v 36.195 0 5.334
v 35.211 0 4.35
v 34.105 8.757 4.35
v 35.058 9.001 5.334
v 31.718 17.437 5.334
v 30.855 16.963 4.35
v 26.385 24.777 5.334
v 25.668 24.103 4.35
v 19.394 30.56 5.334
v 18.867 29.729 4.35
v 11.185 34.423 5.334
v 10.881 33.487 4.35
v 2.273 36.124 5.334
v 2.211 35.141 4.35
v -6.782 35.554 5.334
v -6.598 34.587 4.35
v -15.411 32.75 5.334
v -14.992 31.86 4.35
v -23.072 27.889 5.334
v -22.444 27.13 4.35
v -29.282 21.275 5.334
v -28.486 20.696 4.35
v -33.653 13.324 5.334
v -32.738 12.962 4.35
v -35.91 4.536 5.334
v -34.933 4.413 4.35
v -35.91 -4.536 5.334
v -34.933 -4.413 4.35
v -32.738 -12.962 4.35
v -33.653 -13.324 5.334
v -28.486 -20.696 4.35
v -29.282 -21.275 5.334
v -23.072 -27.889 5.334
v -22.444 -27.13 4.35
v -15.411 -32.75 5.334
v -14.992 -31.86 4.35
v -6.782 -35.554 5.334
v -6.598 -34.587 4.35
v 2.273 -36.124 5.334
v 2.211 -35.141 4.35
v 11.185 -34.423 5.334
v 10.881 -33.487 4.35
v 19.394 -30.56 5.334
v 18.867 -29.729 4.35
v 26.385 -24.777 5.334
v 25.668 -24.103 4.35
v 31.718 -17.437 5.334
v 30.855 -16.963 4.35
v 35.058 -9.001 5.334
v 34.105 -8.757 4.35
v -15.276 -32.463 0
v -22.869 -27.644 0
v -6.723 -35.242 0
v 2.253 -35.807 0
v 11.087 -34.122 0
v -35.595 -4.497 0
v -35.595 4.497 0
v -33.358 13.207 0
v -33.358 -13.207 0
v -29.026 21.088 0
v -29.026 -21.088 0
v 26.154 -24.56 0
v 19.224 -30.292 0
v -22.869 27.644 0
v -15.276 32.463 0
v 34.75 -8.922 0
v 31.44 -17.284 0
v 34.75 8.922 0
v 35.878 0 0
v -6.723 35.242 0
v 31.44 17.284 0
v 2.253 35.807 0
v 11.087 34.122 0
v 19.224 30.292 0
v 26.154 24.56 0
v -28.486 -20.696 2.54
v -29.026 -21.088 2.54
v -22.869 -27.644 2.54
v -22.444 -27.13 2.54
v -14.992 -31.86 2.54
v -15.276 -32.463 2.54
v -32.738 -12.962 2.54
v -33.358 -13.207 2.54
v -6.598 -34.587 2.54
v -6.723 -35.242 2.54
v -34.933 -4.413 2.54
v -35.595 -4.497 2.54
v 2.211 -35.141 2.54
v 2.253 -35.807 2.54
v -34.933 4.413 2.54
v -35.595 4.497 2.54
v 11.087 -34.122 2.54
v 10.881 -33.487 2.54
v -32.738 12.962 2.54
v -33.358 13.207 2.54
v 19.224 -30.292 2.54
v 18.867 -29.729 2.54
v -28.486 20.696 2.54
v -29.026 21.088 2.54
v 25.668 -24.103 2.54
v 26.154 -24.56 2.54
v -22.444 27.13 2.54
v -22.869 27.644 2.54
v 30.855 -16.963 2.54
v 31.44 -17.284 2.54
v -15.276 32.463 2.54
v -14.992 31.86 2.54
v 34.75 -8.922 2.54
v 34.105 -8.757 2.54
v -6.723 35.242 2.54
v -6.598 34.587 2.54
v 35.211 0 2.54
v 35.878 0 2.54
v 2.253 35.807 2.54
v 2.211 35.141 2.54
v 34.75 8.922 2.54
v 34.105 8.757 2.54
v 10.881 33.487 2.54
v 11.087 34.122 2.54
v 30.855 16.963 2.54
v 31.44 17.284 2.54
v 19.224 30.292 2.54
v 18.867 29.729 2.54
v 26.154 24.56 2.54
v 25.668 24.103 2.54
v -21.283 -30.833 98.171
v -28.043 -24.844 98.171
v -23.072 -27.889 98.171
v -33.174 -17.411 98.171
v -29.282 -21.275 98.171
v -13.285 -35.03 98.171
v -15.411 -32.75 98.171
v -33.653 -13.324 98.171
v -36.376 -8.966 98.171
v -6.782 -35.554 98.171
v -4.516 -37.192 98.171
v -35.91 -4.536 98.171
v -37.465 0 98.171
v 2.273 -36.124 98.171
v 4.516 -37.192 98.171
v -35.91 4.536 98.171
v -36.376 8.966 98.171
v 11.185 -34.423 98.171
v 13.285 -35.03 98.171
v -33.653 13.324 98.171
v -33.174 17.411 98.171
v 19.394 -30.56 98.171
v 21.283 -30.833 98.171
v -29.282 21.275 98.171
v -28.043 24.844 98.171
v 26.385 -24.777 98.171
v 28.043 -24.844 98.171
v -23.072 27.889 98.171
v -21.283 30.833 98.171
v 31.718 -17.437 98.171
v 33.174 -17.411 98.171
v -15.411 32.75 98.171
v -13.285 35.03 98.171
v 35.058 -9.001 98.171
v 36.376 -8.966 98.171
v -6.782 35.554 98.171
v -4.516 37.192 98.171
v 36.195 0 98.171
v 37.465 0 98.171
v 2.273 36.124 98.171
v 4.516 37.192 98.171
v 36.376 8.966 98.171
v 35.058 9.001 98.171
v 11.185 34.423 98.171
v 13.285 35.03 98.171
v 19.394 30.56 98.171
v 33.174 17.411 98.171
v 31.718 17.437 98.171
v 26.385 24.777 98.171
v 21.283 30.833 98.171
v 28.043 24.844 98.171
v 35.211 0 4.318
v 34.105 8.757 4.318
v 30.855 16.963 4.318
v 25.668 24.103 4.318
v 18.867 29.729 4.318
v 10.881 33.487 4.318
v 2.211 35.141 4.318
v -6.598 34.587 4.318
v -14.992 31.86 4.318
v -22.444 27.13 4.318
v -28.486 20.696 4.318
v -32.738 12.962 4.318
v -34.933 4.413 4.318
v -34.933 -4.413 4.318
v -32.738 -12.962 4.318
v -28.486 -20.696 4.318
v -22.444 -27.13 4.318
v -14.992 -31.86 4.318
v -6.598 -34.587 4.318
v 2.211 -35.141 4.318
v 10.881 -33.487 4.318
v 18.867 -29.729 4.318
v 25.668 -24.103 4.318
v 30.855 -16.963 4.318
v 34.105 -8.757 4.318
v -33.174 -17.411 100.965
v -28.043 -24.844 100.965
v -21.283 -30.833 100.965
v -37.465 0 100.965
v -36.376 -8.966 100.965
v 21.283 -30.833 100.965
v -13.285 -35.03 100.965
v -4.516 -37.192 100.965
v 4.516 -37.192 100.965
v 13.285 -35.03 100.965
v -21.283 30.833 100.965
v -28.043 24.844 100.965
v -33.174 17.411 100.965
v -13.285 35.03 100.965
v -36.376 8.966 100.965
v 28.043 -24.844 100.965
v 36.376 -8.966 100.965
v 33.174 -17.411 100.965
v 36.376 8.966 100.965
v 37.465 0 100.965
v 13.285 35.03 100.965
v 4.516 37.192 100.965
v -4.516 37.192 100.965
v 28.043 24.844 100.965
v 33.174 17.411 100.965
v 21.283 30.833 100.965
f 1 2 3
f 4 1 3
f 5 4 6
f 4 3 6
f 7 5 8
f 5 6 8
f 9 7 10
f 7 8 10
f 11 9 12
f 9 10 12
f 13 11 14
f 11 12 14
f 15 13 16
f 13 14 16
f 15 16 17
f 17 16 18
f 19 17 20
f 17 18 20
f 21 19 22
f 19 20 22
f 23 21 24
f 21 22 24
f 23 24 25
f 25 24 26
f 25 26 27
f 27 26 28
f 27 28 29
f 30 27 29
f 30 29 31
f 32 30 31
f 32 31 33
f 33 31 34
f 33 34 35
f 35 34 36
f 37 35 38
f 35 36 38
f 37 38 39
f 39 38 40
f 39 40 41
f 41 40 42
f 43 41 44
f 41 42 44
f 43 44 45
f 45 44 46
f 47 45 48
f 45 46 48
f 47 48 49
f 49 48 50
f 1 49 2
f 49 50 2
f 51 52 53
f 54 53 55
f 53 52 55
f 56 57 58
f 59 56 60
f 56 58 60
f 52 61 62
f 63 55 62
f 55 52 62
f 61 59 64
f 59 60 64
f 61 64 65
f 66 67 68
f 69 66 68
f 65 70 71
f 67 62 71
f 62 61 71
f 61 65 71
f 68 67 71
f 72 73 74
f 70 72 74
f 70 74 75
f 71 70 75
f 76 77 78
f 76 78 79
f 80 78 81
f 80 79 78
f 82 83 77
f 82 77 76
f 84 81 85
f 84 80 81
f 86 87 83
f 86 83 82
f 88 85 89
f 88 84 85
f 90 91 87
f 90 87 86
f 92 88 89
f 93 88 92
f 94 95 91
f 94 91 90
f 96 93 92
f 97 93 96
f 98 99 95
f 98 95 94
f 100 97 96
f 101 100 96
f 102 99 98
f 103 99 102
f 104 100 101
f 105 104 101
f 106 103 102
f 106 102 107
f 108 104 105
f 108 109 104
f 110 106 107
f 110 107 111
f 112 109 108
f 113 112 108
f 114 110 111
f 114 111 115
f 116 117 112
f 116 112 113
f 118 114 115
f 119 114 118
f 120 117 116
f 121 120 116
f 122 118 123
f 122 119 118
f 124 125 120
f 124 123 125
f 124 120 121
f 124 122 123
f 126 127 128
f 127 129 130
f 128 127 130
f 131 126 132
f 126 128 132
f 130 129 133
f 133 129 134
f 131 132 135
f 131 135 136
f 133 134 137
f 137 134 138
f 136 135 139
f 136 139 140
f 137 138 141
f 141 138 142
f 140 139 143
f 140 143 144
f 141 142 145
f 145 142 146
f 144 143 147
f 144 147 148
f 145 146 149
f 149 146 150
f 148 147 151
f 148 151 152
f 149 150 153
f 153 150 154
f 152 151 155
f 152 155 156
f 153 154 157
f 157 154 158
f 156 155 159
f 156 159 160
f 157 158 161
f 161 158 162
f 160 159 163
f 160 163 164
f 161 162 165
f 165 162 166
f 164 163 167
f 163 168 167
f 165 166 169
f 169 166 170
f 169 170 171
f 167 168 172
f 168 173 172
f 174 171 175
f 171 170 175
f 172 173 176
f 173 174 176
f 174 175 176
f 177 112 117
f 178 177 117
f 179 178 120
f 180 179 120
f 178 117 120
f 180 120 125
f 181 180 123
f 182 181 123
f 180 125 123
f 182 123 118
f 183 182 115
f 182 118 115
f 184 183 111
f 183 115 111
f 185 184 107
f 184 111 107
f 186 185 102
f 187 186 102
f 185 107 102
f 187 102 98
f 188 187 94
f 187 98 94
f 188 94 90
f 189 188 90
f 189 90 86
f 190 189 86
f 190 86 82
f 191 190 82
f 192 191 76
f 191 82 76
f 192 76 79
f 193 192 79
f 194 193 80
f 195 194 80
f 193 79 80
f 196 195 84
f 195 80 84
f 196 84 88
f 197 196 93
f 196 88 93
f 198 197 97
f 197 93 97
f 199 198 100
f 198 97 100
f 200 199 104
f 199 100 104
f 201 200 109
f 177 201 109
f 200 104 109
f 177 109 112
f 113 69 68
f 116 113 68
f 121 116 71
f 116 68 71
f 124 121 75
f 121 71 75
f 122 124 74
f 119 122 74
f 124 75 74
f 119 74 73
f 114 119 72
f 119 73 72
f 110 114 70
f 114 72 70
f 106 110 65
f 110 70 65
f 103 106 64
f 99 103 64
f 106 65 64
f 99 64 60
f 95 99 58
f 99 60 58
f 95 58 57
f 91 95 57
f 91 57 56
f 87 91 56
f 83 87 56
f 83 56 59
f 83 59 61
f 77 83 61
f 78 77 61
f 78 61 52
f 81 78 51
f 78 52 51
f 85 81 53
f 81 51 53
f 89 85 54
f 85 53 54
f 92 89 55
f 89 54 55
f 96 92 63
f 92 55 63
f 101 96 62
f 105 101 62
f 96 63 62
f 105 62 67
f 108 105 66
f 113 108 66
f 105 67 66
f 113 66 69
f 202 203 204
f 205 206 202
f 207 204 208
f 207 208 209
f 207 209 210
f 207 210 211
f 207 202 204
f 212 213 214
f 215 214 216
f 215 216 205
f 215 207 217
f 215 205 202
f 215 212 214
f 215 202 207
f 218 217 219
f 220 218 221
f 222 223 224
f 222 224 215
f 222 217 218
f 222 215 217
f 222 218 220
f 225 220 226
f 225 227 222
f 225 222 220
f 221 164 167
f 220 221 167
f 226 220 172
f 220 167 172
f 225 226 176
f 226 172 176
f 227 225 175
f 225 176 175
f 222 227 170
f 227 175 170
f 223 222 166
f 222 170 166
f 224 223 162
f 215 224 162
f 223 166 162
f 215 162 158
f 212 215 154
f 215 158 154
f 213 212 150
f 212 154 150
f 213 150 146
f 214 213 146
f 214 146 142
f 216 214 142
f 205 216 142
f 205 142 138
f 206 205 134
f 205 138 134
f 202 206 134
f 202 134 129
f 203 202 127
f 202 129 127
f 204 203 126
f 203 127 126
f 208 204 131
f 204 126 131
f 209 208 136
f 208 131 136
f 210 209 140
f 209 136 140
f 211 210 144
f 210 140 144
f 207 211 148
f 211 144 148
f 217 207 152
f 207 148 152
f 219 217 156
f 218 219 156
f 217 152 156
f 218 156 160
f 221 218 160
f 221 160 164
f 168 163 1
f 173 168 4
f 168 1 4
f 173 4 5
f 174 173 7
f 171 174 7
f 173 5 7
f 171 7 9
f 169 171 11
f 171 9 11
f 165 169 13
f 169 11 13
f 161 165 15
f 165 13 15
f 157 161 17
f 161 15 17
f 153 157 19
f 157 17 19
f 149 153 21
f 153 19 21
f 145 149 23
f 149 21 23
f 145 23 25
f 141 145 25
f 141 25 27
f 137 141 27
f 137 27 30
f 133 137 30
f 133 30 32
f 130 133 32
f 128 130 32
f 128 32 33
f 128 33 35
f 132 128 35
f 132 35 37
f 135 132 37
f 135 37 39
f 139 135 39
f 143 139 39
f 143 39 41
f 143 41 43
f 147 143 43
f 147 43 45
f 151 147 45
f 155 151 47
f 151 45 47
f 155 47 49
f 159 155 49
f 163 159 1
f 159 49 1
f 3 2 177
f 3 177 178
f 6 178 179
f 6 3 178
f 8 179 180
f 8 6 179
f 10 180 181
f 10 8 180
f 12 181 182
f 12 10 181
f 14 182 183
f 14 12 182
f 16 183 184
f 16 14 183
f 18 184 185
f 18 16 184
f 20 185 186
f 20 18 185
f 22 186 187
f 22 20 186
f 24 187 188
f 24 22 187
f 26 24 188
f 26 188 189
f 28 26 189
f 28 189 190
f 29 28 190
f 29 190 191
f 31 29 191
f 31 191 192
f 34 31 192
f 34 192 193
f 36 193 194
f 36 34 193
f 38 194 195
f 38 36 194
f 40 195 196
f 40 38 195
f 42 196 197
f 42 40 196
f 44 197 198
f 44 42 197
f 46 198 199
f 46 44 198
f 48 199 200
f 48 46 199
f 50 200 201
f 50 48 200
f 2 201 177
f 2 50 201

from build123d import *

# Parameters (mm, degrees)
F0_R        = 35.8775
F1_DEPTH    = 2.54
F2_R        = 35.21075
F3_DEPTH    = 1.778
F4_R        = 36.195
F5_DEPTH    = 93.853
F6_R        = 37.465
F7_DEPTH    = 2.794
F8_S5_R     = 35.21075
F8_T6_DEPTH = 53


# Not quite as in the source:
# - a fillet or chamfer that OpenCascade refuses, or shapes differently, is made with other operations: its cross-section is extruded or revolved along the edge and cut away or added


with BuildPart() as f1:
    # F0 (on Top) → F1 (new body)
    with BuildSketch(Plane.XY):
        Circle(F0_R)
    extrude(amount=F1_DEPTH)

    # F2 (on face) → F3 (join)
    with BuildSketch(Plane.XY.offset(2.54)):
        Circle(F2_R)
    extrude(amount=F3_DEPTH)

    # F4 (on face) → F5 (join)
    with BuildSketch(Plane.XY.offset(4.318)):
        Circle(F4_R)
    extrude(amount=F5_DEPTH)

    # F6 (on face) → F7 (join)
    with BuildSketch(Plane.XY.offset(98.171)):
        Circle(F6_R)
    extrude(amount=F7_DEPTH)

    # F8: chamfer of 1.016 on 1 edges, made by hand


with BuildPart() as f8_tool2:
    # F8_s3 → F8_t4 (revolve)
    with BuildSketch(Plane.XZ):
        Polygon((36.195, 5.334), (35.179, 4.318), (36.195, 4.318), align=None)
    revolve(axis=Axis((0, 0, 4.318), (0, 0, 1)))

    # F8_s5 → F8_t6 (cut, symmetric)
    with BuildSketch(Plane.XY.offset(4.8)):
        Circle(F8_S5_R)
    extrude(amount=F8_T6_DEPTH, both=True, mode=Mode.SUBTRACT)


with BuildPart() as f1_1:
    add(f1.part)

    # F8_t1: cut F8_tool2
    add(f8_tool2.part, mode=Mode.SUBTRACT)


solid = f1_1.part
